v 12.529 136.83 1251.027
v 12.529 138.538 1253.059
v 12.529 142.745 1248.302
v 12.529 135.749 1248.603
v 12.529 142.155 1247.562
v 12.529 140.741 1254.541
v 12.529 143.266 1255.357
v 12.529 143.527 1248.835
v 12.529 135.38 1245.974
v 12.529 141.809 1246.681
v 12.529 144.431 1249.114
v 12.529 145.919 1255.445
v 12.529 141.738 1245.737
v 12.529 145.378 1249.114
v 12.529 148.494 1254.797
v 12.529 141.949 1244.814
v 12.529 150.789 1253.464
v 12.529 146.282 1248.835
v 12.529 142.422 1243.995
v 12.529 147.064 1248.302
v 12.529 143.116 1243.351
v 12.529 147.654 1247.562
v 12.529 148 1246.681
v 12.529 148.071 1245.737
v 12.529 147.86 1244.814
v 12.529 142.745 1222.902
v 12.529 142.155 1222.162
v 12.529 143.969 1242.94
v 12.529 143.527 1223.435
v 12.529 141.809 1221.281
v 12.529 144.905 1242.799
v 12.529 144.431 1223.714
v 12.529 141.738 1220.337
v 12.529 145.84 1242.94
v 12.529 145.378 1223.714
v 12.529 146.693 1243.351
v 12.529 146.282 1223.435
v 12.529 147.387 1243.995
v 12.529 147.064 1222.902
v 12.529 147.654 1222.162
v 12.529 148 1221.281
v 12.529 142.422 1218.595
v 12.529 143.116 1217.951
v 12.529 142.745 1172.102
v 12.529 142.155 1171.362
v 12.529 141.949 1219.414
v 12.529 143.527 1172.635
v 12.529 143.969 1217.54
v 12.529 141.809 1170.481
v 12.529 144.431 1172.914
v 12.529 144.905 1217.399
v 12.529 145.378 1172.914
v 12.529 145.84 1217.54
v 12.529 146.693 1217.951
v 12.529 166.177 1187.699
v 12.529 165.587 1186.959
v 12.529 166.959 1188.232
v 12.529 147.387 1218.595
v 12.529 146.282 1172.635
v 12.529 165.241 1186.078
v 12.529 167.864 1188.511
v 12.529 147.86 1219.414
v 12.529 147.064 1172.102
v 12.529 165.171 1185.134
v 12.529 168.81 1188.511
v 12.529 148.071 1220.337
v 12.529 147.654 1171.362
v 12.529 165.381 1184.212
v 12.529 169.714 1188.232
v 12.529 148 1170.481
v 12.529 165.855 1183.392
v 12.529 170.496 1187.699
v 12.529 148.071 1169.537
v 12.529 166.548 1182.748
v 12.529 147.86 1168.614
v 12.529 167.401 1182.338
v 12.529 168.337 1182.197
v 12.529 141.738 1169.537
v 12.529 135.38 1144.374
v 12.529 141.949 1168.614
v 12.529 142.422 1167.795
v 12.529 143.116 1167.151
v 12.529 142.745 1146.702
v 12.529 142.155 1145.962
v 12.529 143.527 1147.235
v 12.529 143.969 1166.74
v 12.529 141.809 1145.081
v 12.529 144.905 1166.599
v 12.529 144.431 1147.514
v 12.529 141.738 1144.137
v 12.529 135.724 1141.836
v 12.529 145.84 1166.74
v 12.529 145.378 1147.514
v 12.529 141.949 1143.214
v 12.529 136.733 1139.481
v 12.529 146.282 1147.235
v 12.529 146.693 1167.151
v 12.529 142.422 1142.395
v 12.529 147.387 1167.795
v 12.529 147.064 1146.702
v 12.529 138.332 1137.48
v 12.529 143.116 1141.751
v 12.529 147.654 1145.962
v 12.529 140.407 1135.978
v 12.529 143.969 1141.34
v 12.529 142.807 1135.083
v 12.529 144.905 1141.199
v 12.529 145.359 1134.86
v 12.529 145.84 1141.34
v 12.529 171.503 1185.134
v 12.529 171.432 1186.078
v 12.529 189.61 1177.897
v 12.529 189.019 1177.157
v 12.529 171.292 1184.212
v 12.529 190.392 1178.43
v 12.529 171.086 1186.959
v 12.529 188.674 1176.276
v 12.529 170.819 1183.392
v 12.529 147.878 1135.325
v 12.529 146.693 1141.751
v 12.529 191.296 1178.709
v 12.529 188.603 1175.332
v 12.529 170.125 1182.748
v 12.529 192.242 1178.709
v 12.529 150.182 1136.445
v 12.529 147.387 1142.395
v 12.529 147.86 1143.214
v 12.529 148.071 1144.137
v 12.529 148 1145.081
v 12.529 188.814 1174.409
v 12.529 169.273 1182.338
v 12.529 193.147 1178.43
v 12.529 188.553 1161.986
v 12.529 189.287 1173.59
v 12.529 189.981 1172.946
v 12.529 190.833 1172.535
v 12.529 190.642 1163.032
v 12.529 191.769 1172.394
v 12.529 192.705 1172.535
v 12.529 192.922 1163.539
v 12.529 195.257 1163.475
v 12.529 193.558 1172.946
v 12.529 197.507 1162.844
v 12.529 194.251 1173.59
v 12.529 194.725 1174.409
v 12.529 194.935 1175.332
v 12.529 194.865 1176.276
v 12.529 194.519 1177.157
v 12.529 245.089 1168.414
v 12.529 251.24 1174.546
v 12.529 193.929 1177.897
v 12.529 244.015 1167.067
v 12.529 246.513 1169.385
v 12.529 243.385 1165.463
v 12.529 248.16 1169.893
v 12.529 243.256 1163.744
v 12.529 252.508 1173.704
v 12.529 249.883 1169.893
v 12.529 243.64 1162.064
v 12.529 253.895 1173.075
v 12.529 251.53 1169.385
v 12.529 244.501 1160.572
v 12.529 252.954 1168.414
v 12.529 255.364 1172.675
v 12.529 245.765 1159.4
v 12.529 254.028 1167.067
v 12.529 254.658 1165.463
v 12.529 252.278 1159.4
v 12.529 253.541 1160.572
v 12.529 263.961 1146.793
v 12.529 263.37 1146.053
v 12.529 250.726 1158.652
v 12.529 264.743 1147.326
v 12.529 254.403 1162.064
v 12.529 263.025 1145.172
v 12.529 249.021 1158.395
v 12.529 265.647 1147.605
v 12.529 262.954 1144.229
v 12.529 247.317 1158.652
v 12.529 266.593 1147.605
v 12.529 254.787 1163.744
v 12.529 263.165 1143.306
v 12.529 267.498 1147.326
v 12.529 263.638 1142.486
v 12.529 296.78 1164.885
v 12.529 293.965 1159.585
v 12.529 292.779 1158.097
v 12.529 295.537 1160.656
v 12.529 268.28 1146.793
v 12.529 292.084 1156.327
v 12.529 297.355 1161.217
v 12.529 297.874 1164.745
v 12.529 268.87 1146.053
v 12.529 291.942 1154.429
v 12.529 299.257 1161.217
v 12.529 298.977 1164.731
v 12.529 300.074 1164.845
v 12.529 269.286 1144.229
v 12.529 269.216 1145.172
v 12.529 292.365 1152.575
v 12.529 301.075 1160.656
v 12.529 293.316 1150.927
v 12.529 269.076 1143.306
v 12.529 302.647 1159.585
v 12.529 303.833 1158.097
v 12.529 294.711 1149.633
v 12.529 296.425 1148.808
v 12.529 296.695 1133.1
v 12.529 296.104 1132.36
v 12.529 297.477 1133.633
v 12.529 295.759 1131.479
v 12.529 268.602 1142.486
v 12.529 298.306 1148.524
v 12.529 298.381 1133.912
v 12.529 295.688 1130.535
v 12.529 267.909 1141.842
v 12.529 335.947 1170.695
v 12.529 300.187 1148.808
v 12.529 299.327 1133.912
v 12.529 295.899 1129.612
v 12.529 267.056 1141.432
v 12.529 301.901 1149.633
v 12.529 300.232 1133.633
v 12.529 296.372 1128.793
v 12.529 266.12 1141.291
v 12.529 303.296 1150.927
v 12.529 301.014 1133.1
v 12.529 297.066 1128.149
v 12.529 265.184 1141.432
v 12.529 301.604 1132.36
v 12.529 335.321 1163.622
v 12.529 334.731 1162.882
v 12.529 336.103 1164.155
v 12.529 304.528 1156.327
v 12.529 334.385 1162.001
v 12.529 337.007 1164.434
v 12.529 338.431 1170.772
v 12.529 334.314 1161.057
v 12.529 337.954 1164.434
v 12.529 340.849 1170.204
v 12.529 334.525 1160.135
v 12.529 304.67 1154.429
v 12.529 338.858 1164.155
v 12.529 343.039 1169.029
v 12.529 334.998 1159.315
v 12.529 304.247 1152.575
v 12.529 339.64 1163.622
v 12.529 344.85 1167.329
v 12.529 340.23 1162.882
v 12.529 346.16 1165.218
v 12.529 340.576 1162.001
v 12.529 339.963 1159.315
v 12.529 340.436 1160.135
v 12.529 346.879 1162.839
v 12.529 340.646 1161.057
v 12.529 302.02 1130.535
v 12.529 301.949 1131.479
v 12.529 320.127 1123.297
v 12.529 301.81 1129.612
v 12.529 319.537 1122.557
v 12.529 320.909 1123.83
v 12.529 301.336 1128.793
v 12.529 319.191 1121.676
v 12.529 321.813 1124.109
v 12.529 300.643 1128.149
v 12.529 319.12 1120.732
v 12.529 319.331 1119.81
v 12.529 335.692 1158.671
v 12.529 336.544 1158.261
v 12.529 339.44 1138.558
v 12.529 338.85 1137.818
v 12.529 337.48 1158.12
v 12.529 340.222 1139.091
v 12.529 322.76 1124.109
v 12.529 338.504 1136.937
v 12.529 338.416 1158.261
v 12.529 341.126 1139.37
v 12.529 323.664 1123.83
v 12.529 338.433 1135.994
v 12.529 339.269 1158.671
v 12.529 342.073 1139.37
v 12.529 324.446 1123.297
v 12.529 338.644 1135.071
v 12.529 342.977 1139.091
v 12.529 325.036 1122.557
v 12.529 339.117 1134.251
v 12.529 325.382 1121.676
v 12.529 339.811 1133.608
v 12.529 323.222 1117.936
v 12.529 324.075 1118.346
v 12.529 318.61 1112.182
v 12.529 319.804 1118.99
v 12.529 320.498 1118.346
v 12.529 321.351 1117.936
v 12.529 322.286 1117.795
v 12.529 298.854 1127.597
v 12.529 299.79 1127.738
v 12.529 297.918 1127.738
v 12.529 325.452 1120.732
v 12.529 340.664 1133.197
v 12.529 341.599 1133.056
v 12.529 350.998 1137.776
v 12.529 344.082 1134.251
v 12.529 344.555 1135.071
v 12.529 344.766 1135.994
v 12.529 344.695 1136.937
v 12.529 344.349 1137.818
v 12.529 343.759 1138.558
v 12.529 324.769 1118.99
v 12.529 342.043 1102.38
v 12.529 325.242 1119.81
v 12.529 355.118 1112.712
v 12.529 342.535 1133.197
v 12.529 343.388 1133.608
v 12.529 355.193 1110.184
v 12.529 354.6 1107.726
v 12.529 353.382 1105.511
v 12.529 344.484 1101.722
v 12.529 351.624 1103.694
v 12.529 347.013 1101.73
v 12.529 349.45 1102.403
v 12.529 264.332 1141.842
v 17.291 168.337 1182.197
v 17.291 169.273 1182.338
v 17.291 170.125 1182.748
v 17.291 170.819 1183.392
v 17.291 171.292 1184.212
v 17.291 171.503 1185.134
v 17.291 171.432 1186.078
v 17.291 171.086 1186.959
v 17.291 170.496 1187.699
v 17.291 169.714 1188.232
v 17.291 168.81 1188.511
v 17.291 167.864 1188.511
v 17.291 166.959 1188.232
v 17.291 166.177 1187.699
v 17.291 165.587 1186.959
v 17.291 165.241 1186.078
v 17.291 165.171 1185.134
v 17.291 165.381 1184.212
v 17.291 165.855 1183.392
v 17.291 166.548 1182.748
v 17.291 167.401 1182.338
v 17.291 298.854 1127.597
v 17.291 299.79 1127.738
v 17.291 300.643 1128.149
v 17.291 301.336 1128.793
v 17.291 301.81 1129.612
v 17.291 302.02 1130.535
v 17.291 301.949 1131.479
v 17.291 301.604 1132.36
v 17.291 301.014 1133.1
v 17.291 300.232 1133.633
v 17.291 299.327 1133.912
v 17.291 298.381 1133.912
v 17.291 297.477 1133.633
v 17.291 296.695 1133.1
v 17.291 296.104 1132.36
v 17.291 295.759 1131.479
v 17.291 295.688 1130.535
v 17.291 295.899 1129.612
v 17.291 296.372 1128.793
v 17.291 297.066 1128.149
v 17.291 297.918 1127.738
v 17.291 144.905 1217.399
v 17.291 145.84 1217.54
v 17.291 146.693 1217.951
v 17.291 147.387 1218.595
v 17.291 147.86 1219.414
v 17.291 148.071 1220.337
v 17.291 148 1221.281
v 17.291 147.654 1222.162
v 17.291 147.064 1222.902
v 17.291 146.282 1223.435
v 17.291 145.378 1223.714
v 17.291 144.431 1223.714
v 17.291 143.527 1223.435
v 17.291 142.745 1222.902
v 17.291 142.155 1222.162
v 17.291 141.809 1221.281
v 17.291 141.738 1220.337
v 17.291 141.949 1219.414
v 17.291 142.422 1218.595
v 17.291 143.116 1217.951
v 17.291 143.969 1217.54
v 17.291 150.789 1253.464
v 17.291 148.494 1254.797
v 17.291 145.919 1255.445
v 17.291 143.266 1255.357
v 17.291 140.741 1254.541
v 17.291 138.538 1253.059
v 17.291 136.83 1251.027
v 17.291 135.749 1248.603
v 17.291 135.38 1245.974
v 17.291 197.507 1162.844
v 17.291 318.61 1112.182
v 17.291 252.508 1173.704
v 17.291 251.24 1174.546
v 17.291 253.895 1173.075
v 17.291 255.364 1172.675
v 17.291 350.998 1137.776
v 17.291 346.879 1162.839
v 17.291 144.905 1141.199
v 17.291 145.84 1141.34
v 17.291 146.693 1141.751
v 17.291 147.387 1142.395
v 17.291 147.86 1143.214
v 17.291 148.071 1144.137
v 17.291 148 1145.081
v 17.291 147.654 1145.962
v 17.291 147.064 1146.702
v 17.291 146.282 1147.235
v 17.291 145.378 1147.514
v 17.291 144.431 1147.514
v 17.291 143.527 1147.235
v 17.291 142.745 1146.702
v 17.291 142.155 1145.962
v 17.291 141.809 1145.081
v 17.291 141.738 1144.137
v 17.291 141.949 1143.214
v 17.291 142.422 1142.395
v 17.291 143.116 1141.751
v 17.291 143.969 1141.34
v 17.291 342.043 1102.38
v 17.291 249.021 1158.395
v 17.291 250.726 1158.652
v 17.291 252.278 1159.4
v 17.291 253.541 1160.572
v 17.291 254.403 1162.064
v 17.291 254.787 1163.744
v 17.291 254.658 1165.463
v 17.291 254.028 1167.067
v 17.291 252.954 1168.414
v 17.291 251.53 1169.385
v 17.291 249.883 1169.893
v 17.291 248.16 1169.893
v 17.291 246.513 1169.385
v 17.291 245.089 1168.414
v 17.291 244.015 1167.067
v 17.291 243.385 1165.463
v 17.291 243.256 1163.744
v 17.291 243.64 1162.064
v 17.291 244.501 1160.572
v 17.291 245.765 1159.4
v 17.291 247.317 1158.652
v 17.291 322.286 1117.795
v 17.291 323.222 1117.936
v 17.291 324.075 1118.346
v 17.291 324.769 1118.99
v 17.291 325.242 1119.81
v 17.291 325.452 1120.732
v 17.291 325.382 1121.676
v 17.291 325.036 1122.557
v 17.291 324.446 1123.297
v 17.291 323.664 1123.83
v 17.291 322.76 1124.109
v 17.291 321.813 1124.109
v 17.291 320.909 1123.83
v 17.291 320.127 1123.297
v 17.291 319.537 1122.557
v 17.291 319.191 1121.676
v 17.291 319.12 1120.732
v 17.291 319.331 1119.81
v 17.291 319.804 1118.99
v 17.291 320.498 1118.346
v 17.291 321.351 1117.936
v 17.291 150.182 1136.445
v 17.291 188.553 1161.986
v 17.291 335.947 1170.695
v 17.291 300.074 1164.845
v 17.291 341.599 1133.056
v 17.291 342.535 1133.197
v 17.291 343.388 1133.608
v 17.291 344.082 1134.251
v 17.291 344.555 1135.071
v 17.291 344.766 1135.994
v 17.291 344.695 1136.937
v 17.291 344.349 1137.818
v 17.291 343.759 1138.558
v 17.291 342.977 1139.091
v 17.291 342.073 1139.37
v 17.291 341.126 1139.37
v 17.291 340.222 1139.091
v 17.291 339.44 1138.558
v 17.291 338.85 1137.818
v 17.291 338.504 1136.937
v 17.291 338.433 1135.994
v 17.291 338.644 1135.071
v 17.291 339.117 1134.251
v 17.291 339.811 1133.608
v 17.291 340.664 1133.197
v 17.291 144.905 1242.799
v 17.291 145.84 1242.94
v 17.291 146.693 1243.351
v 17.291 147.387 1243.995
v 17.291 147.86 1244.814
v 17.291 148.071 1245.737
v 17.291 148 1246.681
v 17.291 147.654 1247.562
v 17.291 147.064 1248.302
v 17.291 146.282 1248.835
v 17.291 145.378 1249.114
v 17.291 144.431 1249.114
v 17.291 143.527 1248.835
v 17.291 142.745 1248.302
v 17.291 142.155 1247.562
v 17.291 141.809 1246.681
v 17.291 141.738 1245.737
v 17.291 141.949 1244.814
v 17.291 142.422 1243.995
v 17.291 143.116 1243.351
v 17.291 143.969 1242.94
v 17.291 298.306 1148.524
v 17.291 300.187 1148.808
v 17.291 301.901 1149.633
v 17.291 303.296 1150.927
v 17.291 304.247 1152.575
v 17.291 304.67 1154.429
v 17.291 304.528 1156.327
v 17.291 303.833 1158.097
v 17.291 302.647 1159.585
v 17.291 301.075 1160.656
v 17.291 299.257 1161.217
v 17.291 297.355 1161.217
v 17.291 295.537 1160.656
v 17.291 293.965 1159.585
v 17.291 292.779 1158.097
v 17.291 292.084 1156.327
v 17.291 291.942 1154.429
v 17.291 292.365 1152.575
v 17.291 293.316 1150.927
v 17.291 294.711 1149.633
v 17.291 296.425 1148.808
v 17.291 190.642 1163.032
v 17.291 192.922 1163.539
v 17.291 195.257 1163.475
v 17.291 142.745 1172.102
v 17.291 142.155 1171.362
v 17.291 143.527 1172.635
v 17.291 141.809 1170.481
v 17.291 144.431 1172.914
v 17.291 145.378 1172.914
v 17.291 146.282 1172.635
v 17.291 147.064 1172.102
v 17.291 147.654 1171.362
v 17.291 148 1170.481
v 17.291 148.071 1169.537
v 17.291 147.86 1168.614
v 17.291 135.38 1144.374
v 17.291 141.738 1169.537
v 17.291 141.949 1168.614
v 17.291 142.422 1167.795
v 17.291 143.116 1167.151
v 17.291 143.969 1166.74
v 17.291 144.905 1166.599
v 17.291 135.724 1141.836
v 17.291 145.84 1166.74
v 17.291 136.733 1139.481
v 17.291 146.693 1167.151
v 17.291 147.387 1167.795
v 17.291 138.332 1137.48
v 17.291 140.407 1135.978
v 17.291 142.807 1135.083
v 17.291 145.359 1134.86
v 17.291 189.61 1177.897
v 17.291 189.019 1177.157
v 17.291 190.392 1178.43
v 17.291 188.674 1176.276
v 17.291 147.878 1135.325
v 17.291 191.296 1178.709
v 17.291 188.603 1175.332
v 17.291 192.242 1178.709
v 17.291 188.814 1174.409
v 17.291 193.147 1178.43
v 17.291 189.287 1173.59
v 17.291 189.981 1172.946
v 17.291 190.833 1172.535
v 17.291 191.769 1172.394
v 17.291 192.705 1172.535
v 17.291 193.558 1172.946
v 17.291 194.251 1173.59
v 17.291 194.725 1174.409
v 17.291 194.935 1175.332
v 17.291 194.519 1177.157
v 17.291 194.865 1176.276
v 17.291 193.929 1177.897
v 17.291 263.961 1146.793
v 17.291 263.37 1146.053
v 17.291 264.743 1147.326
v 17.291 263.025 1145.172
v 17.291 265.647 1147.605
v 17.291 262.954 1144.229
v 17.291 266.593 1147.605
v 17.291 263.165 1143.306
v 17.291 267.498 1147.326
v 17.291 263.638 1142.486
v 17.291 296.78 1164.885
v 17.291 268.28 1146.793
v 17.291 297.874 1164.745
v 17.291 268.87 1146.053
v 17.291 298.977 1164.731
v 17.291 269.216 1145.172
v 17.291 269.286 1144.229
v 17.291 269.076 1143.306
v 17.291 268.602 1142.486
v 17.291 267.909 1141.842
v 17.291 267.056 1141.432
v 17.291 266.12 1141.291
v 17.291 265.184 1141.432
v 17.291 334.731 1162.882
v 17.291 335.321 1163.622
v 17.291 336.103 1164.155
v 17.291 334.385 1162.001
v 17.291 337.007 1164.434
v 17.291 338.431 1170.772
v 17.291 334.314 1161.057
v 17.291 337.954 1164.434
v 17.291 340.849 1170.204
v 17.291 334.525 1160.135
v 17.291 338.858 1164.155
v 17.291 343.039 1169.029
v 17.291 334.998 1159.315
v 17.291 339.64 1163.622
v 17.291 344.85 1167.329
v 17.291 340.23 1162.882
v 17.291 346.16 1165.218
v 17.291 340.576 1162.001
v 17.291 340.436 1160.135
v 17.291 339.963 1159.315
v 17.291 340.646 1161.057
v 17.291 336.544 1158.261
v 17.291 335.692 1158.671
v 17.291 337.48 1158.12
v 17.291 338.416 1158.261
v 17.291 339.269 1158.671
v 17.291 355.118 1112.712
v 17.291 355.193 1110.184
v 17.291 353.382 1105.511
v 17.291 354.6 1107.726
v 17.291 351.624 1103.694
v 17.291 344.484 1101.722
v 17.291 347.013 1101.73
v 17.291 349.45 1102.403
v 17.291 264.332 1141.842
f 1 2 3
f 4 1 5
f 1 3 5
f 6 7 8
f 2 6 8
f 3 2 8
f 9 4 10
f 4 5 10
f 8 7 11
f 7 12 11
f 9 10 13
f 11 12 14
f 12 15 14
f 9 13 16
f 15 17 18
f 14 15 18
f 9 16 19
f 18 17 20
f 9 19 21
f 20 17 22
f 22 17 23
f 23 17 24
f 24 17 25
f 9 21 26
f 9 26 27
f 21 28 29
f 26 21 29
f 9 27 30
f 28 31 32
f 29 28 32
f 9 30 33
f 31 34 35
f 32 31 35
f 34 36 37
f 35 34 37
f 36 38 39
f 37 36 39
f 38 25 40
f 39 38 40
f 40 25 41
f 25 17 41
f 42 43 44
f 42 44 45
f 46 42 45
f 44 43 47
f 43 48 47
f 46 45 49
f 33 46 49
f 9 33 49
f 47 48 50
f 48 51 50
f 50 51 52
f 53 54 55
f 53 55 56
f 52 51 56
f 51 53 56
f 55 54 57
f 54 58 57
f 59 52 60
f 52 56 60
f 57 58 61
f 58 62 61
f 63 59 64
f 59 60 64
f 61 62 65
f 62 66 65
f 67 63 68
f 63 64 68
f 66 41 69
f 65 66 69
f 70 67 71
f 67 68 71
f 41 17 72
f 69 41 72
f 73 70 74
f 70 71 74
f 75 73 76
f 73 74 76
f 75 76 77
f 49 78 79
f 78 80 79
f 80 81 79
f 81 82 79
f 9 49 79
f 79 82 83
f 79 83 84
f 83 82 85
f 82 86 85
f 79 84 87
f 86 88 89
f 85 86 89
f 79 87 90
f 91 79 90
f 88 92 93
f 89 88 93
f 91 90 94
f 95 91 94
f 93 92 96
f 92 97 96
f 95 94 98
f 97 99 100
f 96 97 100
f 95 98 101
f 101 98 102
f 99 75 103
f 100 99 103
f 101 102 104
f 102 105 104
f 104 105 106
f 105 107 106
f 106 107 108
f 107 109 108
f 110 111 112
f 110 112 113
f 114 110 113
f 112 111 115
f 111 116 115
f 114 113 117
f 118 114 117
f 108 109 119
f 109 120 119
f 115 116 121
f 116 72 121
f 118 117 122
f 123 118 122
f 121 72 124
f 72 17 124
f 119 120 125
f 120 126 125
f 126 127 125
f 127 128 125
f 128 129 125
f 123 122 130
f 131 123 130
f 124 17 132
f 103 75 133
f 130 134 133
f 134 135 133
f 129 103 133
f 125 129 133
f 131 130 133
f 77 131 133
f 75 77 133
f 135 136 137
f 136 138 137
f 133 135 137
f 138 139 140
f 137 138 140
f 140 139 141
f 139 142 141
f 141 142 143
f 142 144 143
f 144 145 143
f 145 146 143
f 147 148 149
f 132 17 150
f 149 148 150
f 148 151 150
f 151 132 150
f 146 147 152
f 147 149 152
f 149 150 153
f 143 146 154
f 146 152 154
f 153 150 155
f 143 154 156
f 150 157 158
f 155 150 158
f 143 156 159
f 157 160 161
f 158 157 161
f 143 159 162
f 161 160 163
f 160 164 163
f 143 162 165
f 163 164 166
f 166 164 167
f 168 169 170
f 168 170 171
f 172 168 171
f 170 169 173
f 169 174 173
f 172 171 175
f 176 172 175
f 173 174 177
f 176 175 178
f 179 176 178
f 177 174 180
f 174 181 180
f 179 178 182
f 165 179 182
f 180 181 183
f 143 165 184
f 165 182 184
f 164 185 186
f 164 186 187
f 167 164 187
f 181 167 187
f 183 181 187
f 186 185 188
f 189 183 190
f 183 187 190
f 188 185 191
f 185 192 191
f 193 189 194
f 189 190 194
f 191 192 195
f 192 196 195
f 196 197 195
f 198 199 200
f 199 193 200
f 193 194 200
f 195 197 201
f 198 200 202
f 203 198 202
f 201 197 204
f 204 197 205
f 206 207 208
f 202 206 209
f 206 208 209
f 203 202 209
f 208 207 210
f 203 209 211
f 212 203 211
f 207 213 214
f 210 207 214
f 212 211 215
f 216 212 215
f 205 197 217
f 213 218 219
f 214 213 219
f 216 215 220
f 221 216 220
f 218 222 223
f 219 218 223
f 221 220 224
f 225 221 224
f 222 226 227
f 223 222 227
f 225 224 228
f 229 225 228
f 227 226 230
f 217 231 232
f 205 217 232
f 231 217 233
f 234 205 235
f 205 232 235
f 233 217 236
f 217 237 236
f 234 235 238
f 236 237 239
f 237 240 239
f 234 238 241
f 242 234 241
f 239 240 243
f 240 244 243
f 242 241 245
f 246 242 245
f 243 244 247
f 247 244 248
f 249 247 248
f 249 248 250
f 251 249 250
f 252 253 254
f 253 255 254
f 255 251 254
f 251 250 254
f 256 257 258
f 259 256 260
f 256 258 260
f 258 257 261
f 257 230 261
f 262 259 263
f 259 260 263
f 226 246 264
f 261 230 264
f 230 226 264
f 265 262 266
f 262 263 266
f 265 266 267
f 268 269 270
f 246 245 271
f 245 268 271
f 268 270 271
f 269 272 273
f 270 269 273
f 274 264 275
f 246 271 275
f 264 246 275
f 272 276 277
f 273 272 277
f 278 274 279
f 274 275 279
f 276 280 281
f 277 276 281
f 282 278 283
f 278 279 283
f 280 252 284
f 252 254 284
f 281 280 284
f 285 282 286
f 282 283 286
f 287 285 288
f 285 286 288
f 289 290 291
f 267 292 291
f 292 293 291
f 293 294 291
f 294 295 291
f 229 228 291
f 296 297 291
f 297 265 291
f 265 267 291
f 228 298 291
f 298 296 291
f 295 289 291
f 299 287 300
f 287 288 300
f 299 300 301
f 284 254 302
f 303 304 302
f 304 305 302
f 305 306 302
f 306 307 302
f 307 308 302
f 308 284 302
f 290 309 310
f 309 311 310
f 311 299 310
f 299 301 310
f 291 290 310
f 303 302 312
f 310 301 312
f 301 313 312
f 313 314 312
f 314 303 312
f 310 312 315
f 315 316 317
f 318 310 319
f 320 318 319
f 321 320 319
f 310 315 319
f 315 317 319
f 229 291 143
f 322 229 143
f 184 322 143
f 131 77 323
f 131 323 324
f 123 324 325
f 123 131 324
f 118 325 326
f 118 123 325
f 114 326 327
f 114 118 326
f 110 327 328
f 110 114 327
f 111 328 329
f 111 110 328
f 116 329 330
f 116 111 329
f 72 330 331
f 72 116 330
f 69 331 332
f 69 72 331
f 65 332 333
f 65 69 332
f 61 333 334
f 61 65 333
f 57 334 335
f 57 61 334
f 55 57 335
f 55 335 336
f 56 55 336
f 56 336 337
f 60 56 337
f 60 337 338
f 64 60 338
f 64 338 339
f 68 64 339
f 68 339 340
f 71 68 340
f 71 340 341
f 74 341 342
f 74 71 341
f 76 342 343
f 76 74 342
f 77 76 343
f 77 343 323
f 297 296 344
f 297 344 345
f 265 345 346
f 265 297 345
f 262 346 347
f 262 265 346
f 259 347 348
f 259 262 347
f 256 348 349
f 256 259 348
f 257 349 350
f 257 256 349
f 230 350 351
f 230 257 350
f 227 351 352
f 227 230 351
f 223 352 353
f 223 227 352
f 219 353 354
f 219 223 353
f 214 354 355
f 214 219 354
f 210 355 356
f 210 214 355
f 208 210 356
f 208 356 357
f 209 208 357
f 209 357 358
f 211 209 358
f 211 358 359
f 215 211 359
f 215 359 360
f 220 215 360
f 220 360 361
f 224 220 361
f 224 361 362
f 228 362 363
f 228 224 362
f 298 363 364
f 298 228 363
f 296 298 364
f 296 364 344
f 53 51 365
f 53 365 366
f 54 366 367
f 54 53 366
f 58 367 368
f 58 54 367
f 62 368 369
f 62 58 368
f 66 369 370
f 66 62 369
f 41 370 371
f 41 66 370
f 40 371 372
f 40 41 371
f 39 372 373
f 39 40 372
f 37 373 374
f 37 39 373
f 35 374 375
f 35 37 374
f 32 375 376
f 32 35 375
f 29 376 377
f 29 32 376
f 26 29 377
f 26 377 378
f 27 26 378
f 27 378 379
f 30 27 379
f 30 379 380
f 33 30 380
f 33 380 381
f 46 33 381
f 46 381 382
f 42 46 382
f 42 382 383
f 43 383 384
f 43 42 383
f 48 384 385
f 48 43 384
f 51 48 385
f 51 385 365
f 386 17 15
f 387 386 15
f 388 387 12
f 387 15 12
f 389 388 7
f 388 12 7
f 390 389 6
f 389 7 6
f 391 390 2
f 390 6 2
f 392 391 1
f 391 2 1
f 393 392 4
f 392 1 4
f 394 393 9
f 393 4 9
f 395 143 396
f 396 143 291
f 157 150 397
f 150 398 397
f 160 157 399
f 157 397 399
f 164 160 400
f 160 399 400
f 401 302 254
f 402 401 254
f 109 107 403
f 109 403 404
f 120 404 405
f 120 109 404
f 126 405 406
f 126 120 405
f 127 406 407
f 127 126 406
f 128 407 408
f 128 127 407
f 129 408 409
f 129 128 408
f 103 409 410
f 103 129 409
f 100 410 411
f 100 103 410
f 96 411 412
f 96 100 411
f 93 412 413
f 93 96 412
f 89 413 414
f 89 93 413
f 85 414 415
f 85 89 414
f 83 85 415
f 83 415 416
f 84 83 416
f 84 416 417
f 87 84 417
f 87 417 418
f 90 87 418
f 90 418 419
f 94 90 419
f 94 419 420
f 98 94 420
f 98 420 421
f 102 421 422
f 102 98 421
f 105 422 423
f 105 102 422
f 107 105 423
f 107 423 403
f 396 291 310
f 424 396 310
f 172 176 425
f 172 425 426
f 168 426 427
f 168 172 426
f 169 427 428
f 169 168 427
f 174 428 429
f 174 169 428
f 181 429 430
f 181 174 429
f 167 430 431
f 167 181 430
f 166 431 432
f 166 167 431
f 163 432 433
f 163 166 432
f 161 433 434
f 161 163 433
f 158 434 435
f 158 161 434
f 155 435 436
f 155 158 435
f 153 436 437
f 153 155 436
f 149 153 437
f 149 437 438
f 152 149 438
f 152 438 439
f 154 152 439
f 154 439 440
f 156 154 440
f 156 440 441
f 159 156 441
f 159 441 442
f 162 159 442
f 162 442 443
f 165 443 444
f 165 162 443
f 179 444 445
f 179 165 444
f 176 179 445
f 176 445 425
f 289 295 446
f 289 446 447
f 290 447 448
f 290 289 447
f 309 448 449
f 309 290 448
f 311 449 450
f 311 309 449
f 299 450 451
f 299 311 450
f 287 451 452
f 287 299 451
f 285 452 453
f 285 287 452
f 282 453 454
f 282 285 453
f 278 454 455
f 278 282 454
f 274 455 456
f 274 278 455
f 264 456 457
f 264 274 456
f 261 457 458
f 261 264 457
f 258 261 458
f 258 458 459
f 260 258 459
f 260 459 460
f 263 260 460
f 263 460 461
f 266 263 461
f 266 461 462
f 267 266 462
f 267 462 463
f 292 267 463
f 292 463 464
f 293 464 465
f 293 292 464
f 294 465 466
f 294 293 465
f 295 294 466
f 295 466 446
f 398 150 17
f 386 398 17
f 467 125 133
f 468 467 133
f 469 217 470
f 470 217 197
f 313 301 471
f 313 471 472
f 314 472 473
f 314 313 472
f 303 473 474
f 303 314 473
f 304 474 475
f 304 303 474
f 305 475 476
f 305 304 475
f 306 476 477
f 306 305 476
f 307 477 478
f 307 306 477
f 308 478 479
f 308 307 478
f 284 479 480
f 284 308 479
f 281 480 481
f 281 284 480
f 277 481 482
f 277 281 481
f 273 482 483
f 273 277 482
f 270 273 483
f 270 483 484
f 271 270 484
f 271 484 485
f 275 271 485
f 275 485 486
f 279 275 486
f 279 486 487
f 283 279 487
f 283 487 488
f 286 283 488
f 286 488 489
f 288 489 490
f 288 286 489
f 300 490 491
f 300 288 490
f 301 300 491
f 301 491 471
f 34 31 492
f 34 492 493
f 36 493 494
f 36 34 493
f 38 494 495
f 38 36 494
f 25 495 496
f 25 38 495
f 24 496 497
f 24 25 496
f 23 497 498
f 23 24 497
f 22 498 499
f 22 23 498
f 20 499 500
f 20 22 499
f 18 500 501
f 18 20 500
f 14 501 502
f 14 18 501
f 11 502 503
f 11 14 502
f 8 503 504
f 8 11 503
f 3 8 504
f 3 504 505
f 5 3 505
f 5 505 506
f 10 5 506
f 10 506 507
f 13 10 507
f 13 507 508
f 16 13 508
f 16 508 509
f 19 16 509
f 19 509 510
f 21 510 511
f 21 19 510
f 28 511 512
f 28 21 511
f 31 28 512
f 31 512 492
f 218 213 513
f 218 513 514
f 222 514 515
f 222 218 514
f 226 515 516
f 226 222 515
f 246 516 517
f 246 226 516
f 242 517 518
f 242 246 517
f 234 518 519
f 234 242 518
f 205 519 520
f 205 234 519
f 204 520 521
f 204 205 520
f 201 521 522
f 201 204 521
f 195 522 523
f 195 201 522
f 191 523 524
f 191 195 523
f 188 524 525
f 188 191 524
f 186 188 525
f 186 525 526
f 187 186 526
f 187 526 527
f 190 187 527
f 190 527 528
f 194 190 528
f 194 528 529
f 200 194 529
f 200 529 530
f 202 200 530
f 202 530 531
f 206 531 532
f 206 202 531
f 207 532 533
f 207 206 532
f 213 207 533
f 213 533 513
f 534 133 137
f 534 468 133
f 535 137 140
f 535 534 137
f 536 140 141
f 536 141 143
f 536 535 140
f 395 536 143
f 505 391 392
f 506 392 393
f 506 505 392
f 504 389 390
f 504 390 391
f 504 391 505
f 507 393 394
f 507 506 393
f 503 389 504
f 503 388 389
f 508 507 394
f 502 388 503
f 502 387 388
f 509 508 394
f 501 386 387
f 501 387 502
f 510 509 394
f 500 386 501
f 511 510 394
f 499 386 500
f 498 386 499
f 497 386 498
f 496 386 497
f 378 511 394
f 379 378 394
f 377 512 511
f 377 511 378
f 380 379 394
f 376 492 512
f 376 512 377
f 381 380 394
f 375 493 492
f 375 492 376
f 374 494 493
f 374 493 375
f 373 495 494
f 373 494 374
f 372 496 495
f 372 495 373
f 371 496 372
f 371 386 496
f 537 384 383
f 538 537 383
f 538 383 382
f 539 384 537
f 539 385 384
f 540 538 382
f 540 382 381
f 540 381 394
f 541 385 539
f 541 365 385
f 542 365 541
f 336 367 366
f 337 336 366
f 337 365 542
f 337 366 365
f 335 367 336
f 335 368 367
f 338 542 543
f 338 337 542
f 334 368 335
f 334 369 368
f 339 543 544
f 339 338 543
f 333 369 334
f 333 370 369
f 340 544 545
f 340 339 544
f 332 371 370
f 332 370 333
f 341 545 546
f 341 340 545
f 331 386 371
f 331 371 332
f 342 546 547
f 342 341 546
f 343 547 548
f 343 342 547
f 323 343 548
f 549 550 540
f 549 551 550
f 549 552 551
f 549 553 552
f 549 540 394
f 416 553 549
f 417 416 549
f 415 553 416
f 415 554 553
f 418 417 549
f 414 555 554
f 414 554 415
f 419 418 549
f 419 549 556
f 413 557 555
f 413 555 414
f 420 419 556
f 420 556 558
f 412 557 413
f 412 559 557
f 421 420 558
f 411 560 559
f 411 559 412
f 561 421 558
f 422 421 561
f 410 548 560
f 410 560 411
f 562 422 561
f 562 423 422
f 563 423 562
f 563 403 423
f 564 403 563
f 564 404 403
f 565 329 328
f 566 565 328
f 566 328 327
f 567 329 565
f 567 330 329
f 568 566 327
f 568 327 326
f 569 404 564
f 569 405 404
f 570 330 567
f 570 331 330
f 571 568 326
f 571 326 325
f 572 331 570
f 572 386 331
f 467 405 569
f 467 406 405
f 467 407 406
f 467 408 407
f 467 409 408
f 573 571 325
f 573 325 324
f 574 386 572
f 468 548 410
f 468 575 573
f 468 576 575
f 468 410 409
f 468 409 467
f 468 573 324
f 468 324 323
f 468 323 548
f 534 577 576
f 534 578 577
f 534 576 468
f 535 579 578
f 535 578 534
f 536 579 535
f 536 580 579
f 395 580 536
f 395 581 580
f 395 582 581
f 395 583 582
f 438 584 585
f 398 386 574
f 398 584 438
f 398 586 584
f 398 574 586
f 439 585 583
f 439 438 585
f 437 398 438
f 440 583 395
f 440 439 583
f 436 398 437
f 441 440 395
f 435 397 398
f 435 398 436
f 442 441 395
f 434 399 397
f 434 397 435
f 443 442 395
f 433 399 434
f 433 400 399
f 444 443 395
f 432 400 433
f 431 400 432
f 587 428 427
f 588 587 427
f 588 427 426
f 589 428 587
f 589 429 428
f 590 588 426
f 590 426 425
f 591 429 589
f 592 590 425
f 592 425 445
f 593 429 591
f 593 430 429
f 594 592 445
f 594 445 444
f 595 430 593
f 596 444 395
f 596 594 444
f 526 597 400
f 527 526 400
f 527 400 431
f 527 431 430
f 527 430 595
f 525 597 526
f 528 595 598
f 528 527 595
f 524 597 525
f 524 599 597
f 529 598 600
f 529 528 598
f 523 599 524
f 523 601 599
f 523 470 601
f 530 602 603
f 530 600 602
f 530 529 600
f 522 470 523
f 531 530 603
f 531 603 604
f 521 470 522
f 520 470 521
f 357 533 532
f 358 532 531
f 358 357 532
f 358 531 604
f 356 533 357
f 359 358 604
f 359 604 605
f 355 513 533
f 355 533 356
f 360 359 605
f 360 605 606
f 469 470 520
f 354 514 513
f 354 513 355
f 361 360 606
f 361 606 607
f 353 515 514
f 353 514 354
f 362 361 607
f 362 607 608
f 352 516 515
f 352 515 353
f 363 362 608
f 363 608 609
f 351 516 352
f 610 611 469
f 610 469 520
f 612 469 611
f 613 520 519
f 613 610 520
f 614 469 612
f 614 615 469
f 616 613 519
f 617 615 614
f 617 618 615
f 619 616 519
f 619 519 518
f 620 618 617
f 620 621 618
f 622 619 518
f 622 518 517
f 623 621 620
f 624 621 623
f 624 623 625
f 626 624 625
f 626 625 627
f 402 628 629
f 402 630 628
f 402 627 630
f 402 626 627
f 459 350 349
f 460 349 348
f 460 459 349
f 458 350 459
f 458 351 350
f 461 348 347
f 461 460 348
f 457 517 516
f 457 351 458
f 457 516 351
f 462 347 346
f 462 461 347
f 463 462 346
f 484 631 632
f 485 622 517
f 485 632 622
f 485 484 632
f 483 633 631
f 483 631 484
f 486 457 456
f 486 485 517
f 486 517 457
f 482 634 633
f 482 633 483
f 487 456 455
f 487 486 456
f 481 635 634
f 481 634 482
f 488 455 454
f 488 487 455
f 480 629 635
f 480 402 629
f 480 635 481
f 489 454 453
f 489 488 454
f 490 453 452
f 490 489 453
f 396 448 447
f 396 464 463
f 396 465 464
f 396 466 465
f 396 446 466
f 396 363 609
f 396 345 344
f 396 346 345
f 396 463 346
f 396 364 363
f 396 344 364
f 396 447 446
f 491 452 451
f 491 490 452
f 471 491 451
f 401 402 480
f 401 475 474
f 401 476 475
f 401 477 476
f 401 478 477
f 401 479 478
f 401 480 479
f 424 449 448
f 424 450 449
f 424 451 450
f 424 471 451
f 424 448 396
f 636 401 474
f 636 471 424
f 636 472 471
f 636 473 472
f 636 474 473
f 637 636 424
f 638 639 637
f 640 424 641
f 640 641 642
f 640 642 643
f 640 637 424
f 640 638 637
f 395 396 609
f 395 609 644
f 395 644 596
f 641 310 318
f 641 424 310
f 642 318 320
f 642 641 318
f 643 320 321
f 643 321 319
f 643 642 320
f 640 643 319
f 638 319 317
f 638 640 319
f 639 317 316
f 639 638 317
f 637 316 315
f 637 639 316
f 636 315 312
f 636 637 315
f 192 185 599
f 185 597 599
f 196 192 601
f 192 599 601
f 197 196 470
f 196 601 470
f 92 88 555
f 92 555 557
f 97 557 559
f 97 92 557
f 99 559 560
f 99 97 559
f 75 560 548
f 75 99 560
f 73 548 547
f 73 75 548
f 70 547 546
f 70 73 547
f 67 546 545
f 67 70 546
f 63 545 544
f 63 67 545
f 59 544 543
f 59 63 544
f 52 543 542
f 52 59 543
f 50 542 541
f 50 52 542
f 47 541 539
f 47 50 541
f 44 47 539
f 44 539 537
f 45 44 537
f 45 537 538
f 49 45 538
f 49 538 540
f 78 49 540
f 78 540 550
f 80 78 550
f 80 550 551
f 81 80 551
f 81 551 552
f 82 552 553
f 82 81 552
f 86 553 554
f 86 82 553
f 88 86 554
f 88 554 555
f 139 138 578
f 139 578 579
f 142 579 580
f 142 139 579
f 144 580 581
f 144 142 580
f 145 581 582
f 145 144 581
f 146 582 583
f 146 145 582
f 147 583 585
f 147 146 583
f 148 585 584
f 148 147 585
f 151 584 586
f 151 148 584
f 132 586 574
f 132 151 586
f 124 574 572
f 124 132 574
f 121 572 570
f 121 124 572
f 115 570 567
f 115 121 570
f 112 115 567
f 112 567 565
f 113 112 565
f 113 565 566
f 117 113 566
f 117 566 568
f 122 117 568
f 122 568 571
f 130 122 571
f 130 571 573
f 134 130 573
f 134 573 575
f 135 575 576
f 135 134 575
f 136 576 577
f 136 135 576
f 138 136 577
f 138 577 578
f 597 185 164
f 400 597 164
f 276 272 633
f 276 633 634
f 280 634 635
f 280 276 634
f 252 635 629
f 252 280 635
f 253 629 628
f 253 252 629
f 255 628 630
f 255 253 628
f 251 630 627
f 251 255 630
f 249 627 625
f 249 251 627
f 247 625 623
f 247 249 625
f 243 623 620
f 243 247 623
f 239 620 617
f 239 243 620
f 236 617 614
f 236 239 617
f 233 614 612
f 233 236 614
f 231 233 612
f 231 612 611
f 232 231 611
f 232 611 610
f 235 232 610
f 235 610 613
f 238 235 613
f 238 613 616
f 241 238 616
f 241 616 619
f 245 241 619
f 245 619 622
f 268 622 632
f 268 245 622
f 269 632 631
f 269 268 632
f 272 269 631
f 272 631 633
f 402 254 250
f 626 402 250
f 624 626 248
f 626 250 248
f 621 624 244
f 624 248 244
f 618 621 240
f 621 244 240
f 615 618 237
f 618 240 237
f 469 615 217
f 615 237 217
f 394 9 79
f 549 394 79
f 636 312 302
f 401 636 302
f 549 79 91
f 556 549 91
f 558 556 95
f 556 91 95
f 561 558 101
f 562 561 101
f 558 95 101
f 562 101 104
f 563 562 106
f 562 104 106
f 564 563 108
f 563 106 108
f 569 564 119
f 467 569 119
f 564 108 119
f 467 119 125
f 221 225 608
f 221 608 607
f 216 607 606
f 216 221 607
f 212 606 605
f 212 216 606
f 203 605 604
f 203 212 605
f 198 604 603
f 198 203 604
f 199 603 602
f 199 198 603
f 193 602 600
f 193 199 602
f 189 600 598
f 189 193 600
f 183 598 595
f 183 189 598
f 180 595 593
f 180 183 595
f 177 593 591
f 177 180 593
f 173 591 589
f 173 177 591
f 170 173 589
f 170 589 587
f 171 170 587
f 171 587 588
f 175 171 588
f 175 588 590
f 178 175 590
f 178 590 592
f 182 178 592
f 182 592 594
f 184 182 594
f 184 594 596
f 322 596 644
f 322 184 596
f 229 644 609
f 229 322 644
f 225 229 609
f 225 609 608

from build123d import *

# Parameters (mm, degrees)
BOSS_EXTRUDE1_START = 12.528612
SKETCH2_R           = 3.175
SKETCH2_R_2         = 5.781305793
SKETCH2_R_3         = 6.382098514
BOSS_EXTRUDE1_DEPTH = 4.7625
FILLET1_R           = 9.525


with BuildPart() as part:
    # Sketch2 → Boss-Extrude1 (new body)
    with BuildSketch(Plane(origin=(0, 0, 0), x_dir=(0, 0, -1), z_dir=(1, 0, 0)).offset(BOSS_EXTRUDE1_START)):
        with BuildLine():
            ThreePointArc((-1144.374252892, 135.379574554), (-1135.977897239, 140.407148985), (-1136.445227254, 150.182469725))
            Line((-1136.445227254, 150.182469725), (-1164.81319381, 192.799900886))
            Line((-1164.81319381, 192.799900886), (-1112.182497939, 318.610437742))
            Line((-1112.182497939, 318.610437742), (-1095.74378362, 357.906203065))
            Line((-1095.74378362, 357.906203065), (-1137.77556383, 350.998384801))
            Line((-1137.77556383, 350.998384801), (-1162.839331646, 346.879217061))
            ThreePointArc((-1162.839331646, 346.879217061), (-1169.029486958, 343.038885374), (-1170.695468345, 335.947293432))
            Line((-1170.695468345, 335.947293432), (-1164.57634177, 298.423200658))
            Line((-1164.57634177, 298.423200658), (-1173.106250375, 253.07288466))
            Line((-1173.106250375, 253.07288466), (-1253.464218567, 150.788964003))
            ThreePointArc((-1253.464218567, 150.788964003), (-1254.540886843, 140.740633182), (-1245.974252892, 135.379574554))
            Line((-1245.974252892, 135.379574554), (-1144.374252892, 135.379574554))
        make_face()
        with Locations((-1245.974252892, 144.904574554)):
            Circle(SKETCH2_R, mode=Mode.SUBTRACT)
        with Locations((-1220.574252892, 144.904574554)):
            Circle(SKETCH2_R, mode=Mode.SUBTRACT)
        with Locations((-1185.371762566, 168.336842549)):
            Circle(SKETCH2_R, mode=Mode.SUBTRACT)
        with Locations((-1169.774252892, 144.904574554)):
            Circle(SKETCH2_R, mode=Mode.SUBTRACT)
        with Locations((-1144.374252892, 144.904574554)):
            Circle(SKETCH2_R, mode=Mode.SUBTRACT)
        with Locations((-1175.56927224, 191.769110545)):
            Circle(SKETCH2_R, mode=Mode.SUBTRACT)
        with Locations((-1164.176264161, 249.021430388)):
            Circle(SKETCH2_R_2, mode=Mode.SUBTRACT)
        with Locations((-1144.465794272, 266.120118002)):
            Circle(SKETCH2_R, mode=Mode.SUBTRACT)
        with Locations((-1154.90639106, 298.305859313)):
            Circle(SKETCH2_R_3, mode=Mode.SUBTRACT)
        with Locations((-1130.772088763, 298.854103619)):
            Circle(SKETCH2_R, mode=Mode.SUBTRACT)
        with Locations((-1161.294643743, 337.48030413)):
            Circle(SKETCH2_R, mode=Mode.SUBTRACT)
        with Locations((-1136.230875927, 341.59947187)):
            Circle(SKETCH2_R, mode=Mode.SUBTRACT)
        with Locations((-1120.969598437, 322.286371614)):
            Circle(SKETCH2_R, mode=Mode.SUBTRACT)
    extrude(amount=BOSS_EXTRUDE1_DEPTH)

    # Fillet1
    fillet1_edges = [part.edges().sort_by_distance(p)[0] for p in [
        (14.909862, 357.906203065, 1095.74378362),
        (14.909862, 192.799900886, 1164.81319381),
        (14.909862, 253.07288466, 1173.106250375),
        (14.909862, 298.423200658, 1164.57634177),
    ]]
    fillet(fillet1_edges, radius=FILLET1_R)


solid = part.part
